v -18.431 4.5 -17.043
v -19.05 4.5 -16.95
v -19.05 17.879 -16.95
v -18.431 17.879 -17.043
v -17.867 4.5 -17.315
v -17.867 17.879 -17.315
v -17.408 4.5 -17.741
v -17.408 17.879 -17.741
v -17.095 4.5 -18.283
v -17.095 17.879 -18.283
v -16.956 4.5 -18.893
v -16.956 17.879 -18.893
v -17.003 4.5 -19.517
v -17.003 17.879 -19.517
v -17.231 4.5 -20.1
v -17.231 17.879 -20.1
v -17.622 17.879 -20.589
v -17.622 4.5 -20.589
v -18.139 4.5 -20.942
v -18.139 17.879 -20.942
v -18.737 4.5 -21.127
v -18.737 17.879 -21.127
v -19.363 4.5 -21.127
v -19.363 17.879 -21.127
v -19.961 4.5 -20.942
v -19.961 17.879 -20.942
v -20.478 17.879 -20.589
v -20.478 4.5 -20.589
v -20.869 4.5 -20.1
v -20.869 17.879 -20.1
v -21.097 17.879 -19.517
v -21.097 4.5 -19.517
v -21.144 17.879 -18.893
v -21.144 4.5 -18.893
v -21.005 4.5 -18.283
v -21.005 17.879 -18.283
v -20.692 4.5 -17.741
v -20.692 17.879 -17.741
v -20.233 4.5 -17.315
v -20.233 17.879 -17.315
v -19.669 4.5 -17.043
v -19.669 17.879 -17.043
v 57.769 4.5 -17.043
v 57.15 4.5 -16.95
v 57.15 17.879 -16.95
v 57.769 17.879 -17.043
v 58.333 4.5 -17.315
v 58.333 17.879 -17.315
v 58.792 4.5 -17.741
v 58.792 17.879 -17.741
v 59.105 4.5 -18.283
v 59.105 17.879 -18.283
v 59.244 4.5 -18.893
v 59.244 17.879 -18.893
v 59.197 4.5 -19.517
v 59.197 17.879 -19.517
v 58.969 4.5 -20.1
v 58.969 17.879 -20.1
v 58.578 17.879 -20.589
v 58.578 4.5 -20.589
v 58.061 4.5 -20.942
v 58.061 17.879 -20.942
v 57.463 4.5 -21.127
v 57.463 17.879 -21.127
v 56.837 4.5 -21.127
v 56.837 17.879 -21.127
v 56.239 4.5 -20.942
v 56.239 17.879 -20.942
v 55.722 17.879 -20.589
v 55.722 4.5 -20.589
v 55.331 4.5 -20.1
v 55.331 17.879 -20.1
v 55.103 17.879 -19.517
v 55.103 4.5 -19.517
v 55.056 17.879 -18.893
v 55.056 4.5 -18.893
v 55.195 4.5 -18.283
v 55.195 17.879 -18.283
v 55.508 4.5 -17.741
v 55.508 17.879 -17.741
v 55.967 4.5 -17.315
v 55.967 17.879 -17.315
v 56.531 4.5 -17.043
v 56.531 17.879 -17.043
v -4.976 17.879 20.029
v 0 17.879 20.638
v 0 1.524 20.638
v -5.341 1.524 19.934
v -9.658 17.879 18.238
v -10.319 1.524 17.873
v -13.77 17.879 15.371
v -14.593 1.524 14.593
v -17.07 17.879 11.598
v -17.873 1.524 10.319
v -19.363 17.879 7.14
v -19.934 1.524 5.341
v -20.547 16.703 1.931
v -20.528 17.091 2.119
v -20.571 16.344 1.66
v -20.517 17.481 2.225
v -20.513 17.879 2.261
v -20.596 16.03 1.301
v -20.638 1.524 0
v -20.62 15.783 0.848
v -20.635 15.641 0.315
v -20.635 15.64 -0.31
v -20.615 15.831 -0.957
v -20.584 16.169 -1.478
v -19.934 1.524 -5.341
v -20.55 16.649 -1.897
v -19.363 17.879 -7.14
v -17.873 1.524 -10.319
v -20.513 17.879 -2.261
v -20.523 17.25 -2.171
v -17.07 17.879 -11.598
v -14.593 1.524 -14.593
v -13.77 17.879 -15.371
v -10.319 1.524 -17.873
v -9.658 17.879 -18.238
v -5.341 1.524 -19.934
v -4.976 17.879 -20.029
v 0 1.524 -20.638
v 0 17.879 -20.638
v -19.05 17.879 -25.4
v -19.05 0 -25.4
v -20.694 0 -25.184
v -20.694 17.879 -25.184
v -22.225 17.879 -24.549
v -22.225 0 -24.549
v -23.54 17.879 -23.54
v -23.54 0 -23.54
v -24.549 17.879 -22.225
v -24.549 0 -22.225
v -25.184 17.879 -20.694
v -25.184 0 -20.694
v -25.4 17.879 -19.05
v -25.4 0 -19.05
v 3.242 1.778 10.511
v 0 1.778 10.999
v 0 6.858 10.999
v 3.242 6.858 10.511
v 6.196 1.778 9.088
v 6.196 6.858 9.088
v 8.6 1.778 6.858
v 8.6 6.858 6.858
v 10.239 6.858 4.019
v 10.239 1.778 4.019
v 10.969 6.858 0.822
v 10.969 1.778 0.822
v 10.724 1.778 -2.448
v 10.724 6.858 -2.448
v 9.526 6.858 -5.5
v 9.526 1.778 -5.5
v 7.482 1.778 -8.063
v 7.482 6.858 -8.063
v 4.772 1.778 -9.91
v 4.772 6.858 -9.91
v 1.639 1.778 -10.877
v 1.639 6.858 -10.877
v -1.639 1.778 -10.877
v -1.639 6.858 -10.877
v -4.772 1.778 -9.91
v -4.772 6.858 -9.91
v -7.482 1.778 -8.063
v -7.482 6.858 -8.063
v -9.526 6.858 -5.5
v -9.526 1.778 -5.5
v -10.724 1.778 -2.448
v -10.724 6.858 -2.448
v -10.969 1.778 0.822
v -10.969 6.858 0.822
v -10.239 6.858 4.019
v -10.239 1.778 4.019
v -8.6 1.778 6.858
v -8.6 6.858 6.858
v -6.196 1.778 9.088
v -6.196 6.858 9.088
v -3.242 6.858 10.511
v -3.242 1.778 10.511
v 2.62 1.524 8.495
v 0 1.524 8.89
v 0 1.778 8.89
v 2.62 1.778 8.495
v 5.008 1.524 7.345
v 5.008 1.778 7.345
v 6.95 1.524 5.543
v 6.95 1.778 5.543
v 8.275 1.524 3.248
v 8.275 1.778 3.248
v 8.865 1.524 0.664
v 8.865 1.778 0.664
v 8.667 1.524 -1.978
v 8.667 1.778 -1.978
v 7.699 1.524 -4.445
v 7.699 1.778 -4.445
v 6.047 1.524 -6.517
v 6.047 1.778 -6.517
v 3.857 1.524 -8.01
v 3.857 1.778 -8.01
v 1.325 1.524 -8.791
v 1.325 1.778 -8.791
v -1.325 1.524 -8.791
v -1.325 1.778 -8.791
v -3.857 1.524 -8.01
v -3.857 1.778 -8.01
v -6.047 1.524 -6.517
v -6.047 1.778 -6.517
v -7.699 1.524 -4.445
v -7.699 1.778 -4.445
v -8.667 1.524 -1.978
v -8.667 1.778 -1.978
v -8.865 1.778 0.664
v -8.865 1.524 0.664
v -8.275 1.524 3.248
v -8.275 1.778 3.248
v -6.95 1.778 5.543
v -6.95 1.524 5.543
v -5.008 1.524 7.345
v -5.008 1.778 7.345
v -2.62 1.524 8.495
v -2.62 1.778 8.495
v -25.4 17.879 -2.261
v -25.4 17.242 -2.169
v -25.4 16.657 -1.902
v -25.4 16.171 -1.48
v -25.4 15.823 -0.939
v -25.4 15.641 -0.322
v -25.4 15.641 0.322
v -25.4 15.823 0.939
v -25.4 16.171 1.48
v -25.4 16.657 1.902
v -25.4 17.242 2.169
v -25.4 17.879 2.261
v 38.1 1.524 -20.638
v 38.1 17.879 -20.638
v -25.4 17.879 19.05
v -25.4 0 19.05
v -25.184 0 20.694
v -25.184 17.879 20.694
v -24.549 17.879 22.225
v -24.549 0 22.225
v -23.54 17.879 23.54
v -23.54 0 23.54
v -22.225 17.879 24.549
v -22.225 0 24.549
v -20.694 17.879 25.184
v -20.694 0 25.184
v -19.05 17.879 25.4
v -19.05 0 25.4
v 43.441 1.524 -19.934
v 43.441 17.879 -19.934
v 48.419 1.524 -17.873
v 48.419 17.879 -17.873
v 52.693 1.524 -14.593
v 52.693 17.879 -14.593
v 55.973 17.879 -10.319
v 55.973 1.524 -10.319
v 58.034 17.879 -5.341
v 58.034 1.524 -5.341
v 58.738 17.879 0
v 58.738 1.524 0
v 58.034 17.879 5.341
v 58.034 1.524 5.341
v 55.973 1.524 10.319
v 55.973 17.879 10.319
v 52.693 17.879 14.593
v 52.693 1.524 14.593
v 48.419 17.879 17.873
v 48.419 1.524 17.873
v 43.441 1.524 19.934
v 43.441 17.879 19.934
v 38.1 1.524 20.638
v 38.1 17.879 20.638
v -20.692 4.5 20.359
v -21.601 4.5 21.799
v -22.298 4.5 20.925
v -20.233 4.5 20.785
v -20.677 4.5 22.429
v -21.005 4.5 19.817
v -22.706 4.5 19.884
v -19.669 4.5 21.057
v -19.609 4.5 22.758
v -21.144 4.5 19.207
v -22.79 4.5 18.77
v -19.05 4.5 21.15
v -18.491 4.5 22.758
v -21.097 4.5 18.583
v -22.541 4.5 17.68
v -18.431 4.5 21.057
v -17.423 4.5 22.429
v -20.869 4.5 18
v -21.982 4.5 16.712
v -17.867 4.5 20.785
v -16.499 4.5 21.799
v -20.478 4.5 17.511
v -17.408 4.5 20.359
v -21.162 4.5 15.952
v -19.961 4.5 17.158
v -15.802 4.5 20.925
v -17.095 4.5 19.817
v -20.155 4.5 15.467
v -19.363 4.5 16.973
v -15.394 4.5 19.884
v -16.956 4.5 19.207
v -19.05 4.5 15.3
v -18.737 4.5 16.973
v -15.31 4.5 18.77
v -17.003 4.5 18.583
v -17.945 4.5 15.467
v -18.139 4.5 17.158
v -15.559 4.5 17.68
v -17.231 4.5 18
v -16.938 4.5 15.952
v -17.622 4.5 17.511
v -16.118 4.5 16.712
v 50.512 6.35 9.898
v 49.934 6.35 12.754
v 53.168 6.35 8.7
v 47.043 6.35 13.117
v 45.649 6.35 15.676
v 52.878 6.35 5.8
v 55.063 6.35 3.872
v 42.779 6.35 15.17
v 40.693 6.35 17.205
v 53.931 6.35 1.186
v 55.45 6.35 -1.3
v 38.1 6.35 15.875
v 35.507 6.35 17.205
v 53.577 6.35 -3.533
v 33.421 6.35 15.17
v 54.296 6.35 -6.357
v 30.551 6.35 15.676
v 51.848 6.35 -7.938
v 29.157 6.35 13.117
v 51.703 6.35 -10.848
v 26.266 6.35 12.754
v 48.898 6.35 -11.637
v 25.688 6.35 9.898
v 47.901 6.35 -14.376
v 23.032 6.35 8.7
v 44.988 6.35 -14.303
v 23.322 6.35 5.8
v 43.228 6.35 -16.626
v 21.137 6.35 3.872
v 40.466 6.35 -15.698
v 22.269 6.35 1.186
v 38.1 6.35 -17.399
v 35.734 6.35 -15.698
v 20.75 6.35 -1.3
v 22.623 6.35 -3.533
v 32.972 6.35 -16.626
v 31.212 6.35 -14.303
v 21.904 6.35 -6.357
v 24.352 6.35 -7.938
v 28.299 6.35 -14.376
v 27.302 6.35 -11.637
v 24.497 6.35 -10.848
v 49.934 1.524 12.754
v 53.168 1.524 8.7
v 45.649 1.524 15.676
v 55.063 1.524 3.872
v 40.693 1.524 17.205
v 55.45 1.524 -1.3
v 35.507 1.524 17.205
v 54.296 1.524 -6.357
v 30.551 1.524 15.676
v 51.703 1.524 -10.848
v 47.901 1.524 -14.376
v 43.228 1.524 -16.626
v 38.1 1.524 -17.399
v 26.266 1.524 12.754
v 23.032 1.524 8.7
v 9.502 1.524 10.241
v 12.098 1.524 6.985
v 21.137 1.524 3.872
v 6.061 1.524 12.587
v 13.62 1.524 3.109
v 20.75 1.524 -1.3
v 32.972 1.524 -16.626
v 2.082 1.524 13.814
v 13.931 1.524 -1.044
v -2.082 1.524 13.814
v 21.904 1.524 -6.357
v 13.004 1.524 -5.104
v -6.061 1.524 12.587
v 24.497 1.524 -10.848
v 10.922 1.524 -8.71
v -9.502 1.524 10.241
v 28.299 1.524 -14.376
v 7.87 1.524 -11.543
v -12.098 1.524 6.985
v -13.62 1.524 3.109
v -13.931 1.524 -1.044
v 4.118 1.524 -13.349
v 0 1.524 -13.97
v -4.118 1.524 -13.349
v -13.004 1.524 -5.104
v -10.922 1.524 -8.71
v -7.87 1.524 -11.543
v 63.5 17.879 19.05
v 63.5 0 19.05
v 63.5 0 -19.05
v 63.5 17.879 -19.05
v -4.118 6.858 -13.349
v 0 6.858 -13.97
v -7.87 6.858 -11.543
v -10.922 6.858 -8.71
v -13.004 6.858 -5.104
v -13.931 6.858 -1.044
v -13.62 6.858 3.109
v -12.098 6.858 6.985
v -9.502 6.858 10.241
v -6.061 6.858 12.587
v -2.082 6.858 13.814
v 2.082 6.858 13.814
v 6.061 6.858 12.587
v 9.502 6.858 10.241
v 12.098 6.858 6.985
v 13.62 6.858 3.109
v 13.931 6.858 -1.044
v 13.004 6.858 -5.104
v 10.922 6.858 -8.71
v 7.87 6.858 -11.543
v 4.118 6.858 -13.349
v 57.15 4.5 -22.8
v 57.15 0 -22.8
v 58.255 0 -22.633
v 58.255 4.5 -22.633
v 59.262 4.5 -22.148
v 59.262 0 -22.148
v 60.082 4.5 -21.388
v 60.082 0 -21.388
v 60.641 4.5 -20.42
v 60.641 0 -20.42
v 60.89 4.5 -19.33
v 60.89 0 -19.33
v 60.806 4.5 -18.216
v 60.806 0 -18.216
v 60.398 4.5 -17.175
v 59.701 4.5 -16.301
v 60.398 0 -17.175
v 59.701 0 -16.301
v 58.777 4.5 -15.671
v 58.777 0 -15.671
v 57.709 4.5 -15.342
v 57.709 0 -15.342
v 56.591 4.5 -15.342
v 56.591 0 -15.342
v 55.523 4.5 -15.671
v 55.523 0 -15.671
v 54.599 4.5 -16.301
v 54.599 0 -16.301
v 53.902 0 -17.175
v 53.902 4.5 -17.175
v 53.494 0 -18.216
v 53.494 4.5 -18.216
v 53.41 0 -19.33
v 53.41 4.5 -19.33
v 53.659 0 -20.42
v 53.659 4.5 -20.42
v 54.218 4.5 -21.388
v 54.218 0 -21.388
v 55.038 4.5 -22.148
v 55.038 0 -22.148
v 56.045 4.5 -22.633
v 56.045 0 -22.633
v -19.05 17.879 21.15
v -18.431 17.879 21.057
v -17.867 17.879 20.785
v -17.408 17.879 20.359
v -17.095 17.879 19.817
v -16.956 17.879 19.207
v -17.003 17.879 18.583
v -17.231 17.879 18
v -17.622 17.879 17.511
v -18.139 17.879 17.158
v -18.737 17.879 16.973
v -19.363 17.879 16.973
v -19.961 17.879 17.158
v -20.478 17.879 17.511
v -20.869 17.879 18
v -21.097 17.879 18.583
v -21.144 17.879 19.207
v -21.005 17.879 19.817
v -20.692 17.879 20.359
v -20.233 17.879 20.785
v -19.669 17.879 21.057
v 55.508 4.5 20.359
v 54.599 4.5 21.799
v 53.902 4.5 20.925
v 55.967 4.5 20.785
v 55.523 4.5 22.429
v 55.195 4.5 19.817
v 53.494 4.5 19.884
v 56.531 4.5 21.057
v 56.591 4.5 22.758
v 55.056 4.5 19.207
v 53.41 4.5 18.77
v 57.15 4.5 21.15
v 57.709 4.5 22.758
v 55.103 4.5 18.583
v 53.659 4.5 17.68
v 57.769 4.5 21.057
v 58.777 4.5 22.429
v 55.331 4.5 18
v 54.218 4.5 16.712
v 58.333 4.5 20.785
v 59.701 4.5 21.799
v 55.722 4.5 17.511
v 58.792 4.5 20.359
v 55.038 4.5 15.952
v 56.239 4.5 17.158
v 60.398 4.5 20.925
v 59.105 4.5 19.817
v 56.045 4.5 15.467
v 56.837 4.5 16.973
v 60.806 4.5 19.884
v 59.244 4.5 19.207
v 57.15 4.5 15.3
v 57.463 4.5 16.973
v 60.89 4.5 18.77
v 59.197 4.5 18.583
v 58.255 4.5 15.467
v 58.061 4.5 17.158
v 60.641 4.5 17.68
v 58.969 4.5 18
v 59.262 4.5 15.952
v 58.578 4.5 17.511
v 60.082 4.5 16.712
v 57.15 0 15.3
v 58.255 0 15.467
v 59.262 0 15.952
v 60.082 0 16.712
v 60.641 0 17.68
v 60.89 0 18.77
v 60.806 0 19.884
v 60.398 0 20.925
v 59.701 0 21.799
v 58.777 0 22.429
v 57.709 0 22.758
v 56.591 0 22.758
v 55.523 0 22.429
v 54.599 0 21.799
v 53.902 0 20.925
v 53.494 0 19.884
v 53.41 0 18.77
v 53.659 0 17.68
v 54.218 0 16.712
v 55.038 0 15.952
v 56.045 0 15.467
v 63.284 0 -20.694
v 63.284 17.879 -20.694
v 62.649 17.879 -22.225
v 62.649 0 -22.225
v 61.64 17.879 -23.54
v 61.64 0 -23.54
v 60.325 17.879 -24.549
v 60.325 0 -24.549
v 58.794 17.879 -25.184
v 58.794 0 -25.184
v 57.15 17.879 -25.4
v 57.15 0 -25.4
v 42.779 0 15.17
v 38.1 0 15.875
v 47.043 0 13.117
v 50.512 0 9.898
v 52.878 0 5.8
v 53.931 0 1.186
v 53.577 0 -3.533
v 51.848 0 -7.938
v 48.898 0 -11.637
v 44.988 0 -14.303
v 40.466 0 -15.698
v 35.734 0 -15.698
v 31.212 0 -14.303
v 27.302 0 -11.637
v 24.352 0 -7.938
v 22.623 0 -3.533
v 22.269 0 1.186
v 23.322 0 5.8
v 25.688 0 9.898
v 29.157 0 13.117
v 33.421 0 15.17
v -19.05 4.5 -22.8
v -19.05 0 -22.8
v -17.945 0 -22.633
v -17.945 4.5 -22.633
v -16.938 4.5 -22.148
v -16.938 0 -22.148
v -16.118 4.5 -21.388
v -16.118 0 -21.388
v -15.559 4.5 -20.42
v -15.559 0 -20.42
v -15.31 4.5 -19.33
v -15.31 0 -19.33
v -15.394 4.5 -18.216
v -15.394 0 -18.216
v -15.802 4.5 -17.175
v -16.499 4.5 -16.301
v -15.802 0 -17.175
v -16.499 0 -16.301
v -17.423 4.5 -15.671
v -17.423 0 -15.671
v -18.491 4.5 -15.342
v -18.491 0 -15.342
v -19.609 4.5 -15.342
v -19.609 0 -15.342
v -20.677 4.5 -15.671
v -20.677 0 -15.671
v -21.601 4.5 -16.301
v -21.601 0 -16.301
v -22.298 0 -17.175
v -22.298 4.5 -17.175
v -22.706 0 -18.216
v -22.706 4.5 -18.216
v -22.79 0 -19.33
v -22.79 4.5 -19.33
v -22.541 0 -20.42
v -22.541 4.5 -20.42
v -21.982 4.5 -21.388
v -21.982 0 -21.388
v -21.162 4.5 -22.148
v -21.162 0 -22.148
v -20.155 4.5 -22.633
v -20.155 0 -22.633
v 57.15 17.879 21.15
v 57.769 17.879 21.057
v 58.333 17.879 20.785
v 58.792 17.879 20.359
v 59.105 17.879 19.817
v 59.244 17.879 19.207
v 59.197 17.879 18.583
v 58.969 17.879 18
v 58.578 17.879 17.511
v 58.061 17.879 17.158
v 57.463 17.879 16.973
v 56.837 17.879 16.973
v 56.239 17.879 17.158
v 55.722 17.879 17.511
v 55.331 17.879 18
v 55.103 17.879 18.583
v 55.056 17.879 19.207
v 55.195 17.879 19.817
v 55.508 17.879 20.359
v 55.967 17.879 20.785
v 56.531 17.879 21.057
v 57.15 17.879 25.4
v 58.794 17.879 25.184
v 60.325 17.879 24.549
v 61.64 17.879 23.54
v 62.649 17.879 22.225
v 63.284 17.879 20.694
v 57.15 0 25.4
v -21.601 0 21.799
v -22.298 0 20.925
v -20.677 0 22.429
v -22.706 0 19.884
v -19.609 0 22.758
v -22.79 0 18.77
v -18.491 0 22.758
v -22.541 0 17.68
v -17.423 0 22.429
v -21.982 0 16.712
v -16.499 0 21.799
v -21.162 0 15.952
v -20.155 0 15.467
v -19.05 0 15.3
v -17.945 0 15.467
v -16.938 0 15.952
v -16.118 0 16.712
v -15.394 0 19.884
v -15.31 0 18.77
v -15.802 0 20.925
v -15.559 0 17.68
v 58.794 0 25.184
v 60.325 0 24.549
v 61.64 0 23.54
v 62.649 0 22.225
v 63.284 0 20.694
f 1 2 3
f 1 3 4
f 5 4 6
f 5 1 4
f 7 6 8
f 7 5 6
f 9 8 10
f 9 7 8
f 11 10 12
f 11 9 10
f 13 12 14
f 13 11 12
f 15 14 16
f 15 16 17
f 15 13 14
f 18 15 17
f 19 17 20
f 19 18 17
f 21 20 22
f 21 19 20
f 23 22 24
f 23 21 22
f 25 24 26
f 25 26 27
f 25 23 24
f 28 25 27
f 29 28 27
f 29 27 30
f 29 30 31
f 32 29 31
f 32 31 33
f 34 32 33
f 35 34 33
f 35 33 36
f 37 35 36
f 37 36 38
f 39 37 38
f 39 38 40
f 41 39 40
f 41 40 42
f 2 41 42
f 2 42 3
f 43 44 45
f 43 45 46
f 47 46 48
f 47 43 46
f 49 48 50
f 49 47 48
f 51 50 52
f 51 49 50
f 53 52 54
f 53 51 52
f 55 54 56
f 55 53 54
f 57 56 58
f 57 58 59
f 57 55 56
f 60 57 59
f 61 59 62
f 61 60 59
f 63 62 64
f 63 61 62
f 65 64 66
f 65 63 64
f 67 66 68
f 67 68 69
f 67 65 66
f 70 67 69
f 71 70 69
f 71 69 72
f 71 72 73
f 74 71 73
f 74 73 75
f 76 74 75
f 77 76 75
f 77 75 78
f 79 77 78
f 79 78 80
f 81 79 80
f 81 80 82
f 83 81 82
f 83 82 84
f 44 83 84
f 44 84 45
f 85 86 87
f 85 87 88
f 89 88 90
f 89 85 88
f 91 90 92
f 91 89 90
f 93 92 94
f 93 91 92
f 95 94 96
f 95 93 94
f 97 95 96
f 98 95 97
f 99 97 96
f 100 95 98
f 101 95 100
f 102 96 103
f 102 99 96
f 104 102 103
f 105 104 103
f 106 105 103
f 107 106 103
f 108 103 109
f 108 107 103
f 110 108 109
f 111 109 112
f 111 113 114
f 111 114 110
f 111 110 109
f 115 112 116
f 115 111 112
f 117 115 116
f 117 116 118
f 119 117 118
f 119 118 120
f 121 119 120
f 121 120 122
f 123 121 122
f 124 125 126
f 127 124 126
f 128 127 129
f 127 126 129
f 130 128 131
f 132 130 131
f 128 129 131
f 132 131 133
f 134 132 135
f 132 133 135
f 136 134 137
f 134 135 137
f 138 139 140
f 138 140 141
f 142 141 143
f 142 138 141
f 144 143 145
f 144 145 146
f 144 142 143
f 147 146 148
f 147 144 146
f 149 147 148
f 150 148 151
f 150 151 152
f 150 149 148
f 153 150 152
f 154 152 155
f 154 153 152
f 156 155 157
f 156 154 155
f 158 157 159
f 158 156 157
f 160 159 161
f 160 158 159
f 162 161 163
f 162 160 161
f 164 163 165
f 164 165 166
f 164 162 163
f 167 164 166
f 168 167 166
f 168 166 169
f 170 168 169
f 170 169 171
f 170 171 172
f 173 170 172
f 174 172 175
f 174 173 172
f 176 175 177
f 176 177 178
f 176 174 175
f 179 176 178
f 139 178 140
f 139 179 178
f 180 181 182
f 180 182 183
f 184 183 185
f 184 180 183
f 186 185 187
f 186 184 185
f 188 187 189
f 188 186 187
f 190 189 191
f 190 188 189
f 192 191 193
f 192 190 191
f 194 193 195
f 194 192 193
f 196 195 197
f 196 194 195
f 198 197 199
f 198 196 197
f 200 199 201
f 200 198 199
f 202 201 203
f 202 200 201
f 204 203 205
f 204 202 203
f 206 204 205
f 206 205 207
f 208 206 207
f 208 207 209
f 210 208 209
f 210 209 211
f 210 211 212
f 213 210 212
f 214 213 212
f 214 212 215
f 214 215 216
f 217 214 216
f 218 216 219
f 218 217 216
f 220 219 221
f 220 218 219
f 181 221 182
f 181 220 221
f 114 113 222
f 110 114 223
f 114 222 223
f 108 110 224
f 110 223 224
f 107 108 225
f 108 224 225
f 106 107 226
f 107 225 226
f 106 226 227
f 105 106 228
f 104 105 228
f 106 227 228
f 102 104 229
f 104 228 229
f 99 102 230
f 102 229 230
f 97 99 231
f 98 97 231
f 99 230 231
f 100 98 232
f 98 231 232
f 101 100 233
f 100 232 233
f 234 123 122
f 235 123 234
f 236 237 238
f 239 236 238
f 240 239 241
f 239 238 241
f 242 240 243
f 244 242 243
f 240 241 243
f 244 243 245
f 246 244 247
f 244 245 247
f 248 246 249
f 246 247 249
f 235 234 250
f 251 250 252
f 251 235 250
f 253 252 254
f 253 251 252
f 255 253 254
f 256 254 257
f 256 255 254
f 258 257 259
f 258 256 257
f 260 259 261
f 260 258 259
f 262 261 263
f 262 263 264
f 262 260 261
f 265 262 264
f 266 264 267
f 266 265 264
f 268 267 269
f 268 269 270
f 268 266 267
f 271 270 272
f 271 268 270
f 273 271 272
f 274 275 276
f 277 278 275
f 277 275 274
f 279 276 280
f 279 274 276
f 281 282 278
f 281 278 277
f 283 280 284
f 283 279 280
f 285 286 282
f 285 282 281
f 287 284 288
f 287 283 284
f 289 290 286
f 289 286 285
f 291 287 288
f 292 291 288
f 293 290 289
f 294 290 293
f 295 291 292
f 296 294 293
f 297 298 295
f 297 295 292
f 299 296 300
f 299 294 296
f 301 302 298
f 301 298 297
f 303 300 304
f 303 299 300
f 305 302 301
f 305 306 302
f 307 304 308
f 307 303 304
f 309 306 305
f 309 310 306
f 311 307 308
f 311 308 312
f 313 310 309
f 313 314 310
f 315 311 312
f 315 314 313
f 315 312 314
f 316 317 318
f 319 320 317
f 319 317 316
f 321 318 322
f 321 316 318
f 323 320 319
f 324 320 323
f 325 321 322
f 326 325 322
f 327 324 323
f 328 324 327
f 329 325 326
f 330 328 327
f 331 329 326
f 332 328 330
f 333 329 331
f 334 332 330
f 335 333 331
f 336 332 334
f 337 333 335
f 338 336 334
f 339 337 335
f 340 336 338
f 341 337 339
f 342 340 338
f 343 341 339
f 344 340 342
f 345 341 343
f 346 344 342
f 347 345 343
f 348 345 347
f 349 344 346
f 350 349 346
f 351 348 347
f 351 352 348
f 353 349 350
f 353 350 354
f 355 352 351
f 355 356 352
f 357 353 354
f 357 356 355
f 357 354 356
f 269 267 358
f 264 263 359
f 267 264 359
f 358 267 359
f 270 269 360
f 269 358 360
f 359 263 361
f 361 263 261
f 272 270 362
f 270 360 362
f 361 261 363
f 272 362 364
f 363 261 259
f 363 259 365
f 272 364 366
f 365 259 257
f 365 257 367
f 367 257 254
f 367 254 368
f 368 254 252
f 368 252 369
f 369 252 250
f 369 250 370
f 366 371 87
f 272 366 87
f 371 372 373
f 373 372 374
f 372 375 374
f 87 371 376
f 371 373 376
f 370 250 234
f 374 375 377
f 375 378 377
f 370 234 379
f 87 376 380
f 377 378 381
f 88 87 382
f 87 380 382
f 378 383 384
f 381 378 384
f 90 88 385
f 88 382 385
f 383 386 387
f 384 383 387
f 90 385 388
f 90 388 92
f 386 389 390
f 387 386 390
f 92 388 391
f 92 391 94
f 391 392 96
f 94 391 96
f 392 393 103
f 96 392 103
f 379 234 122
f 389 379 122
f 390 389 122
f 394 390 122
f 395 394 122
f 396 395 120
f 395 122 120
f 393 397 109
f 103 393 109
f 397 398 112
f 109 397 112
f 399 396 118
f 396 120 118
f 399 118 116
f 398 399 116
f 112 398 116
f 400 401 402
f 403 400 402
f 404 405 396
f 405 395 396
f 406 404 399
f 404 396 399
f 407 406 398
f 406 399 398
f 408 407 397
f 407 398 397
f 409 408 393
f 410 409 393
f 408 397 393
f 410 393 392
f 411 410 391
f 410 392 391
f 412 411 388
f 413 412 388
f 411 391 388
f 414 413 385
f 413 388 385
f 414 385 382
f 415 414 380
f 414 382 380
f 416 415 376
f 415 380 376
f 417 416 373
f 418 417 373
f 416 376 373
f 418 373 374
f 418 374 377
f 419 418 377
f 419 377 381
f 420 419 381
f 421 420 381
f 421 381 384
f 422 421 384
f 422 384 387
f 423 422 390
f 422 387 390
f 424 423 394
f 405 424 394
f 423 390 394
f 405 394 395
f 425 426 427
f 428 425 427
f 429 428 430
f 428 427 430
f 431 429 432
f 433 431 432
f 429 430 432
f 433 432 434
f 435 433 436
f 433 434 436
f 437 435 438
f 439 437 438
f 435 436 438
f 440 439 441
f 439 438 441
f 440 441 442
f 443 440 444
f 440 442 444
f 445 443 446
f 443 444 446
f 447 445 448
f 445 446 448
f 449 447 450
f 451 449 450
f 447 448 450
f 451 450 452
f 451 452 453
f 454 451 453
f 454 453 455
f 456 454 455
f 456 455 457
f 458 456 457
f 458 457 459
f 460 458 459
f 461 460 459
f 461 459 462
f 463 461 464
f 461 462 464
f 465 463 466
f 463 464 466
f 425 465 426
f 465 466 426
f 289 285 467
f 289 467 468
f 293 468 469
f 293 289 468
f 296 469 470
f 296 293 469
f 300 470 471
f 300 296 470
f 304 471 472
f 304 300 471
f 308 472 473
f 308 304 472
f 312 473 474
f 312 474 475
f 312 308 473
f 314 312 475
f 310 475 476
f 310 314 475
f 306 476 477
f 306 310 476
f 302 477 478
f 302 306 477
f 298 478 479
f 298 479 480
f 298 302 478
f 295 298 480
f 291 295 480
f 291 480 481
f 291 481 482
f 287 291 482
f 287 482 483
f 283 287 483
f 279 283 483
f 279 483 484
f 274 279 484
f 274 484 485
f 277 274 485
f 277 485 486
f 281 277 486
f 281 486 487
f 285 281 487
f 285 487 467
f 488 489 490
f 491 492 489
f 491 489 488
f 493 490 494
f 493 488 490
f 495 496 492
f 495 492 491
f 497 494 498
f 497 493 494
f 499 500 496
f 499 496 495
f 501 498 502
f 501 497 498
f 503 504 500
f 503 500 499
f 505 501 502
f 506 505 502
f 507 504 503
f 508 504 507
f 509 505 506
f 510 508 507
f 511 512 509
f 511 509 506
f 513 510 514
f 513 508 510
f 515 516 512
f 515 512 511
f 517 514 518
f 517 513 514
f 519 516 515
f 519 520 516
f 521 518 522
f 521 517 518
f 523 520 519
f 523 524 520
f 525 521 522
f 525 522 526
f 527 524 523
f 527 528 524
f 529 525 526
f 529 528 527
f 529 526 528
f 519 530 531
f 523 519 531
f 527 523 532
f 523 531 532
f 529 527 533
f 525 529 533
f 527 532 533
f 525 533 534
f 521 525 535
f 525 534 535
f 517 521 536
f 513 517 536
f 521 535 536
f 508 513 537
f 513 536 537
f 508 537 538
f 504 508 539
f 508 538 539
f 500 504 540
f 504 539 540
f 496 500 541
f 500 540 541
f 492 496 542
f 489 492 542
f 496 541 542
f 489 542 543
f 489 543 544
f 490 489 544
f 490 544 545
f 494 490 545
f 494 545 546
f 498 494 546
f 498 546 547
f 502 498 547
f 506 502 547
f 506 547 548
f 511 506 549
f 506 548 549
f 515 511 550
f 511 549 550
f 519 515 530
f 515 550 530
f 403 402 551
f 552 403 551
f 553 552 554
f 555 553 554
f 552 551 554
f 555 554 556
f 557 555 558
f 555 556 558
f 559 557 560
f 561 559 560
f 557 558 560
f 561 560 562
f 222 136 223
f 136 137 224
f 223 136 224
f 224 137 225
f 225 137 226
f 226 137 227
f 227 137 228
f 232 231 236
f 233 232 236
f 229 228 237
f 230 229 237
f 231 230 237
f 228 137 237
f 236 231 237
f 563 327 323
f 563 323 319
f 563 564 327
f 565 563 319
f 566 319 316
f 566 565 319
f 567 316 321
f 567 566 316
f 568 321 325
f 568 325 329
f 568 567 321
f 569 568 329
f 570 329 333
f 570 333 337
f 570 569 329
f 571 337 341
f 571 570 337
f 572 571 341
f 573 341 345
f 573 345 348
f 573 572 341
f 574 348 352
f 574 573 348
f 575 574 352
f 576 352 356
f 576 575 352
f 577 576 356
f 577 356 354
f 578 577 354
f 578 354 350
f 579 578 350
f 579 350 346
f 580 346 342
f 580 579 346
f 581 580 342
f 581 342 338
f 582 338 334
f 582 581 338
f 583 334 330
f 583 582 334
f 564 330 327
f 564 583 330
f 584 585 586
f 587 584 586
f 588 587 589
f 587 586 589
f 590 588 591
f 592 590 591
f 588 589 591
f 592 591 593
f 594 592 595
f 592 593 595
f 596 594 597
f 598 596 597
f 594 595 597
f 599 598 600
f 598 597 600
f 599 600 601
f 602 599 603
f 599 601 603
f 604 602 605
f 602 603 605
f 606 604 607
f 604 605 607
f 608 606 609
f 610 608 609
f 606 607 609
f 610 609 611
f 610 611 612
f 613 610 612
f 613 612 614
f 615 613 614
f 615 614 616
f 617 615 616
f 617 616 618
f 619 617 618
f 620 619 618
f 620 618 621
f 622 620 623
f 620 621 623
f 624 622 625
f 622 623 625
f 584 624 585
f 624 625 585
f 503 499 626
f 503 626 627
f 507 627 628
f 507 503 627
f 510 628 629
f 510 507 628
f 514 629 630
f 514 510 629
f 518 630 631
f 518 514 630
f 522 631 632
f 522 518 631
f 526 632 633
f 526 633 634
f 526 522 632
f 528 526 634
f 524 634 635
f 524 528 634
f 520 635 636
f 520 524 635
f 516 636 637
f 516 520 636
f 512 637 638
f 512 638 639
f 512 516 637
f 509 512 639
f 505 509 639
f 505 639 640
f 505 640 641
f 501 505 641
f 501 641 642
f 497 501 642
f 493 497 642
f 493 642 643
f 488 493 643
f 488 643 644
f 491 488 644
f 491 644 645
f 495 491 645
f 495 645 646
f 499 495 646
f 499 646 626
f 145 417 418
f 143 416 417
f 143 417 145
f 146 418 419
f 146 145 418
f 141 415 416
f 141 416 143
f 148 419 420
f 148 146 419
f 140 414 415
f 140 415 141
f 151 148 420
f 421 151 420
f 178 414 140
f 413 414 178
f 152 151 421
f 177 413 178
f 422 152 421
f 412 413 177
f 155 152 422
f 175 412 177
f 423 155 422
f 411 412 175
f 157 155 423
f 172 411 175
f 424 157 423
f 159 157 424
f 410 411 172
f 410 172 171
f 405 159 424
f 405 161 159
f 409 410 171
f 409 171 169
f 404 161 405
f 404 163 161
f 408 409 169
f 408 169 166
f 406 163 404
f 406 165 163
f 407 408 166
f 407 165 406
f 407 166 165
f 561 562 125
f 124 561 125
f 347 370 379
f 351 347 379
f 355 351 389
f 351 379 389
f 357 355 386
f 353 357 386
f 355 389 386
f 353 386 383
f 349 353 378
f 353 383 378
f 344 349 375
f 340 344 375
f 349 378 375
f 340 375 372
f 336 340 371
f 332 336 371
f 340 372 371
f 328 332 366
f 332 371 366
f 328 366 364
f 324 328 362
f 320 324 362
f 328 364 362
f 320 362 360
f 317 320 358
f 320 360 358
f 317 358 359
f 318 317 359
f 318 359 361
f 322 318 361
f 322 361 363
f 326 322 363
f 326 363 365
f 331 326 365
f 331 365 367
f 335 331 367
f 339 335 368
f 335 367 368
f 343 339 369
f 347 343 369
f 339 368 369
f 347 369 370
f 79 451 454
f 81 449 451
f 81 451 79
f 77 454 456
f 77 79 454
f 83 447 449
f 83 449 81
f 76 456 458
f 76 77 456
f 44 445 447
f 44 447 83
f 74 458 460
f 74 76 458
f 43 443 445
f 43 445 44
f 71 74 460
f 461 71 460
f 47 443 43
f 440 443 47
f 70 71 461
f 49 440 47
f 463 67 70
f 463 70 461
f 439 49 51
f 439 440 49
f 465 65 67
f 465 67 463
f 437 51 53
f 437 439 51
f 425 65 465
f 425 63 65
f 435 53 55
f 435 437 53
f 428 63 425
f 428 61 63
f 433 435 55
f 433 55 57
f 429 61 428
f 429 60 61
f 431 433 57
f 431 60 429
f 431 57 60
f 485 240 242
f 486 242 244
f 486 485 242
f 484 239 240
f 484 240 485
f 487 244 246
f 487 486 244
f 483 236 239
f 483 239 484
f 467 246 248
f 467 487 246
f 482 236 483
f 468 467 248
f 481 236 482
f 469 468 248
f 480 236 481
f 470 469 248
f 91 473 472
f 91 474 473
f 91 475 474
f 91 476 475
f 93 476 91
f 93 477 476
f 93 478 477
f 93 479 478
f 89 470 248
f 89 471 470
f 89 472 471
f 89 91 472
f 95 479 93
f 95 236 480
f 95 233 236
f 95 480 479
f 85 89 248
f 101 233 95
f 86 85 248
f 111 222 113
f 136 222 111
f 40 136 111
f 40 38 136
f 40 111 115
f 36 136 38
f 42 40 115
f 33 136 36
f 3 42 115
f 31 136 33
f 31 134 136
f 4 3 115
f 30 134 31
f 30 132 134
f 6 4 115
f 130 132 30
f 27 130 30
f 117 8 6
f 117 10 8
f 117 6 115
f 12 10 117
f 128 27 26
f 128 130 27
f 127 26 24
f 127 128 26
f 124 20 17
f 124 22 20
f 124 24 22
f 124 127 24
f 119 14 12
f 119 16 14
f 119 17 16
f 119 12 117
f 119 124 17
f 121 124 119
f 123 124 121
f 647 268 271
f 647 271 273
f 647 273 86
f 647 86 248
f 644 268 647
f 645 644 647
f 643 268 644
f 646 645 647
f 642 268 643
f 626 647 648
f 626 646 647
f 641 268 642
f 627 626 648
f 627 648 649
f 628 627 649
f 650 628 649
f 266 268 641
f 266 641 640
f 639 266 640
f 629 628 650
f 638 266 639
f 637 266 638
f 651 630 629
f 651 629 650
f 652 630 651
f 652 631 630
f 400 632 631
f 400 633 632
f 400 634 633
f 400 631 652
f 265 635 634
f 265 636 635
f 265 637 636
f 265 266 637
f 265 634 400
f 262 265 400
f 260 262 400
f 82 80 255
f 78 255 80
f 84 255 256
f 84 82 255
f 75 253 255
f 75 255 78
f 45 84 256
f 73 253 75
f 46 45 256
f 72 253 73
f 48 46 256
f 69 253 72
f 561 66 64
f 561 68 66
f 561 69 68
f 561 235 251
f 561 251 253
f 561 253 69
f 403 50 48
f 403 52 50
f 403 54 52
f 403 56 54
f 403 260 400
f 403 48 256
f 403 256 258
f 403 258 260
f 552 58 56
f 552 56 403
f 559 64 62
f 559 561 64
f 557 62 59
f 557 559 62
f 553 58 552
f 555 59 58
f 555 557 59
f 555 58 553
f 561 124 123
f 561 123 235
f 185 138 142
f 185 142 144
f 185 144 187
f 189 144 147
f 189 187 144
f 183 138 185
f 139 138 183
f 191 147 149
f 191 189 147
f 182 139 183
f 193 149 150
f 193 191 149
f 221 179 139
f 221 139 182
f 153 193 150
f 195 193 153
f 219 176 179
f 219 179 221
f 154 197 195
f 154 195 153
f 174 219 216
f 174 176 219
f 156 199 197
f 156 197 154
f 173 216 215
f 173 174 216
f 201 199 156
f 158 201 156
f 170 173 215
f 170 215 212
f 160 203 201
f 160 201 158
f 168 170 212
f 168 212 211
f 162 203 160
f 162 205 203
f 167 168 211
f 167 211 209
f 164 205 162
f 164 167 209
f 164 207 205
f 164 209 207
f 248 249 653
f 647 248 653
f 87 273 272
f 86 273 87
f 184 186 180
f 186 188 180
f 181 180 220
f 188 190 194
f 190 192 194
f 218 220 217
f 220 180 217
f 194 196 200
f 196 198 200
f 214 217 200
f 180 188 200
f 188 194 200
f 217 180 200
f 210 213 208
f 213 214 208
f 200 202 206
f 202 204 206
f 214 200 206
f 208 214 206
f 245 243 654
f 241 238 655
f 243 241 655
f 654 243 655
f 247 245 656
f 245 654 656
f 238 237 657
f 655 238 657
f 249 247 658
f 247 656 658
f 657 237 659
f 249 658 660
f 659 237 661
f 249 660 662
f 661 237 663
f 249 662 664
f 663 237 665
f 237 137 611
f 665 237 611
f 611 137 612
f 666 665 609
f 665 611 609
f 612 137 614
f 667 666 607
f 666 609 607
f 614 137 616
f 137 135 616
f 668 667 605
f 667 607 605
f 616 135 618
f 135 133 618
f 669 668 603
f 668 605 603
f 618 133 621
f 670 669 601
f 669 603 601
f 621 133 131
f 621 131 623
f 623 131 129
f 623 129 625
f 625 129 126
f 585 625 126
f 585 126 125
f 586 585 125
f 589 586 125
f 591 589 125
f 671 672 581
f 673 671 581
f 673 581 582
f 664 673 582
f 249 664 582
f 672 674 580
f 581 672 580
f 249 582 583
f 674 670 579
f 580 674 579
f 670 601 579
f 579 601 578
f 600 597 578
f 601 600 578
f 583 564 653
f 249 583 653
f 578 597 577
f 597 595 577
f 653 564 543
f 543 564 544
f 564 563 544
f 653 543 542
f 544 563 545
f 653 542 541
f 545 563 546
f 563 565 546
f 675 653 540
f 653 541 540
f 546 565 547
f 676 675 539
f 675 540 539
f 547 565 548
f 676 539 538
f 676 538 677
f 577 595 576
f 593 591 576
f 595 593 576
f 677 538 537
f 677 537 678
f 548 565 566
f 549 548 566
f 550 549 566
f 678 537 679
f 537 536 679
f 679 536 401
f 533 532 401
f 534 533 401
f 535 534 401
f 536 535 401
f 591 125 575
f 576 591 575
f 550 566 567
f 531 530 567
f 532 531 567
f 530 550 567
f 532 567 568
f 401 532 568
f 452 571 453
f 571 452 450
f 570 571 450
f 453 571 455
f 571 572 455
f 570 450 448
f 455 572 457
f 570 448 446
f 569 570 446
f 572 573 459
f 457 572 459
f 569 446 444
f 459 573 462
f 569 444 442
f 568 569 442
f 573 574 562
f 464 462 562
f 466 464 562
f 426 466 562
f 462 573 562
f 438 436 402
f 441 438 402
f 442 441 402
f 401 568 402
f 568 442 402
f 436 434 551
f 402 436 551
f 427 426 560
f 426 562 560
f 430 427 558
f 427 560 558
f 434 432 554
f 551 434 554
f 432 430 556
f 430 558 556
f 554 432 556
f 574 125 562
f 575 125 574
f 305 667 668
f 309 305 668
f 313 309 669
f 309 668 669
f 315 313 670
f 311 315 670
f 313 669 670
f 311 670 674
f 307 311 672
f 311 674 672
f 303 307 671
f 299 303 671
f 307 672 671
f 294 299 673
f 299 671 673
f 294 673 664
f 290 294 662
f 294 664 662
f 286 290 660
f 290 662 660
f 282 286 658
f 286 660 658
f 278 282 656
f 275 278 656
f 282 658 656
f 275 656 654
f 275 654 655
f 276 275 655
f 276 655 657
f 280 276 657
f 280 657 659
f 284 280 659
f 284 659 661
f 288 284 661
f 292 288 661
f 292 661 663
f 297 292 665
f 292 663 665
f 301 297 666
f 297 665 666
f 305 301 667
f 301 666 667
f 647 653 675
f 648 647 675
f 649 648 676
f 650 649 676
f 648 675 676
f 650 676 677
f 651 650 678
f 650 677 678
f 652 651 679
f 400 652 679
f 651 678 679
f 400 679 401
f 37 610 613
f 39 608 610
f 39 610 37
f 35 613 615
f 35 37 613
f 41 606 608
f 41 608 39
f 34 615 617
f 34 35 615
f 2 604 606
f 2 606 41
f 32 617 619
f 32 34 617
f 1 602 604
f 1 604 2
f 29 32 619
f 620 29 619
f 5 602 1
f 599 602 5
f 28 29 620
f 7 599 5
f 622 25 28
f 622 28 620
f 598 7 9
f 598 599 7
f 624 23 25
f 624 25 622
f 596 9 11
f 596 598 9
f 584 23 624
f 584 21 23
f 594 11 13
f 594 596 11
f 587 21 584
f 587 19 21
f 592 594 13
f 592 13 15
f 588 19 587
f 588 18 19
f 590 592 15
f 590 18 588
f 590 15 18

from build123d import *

# Parameters (mm, degrees)
SKETCH1_R               = 15.875
SKETCH1_R_2             = 2.1
BOSS_EXTRUDE1_DEPTH     = 17.87906
CUT_EXTRUDE1_DEPTH      = 16.35506
SKETCH3_R               = 13.97
SKETCH3_R_2             = 8.89
BOSS_EXTRUDE2_DEPTH     = 0.254
SKETCH4_R               = 13.97
SKETCH4_R_2             = 10.99947
BOSS_EXTRUDE3_DEPTH     = 5.08
SKETCH5_R               = 17.399
SKETCH5_R_2             = 15.875
BOSS_EXTRUDE4_DEPTH     = 4.826
CUT_EXTRUDE2_REACH      = 96.17
CUT_EXTRUDE2_END_RADIUS = 20.6375
SKETCH6_R               = 2.2606
SKETCH7_R               = 3.75
CUT_EXTRUDE3_DEPTH      = 4.5


with BuildPart() as part:
    # Sketch1 → Boss-Extrude1 (new body)
    with BuildSketch(Plane(origin=(0, 0, 0), x_dir=(1, 0, 0), z_dir=(0, 1, 0))):
        with BuildLine():
            Line((-19.05, -25.4), (57.15, -25.4))
            ThreePointArc((57.15, -25.4), (61.640128061, -23.540128061), (63.5, -19.05))
            Line((63.5, -19.05), (63.5, 19.05))
            ThreePointArc((63.5, 19.05), (61.640128061, 23.540128061), (57.15, 25.4))
            Line((57.15, 25.4), (-19.05, 25.4))
            ThreePointArc((-19.05, 25.4), (-23.540128061, 23.540128061), (-25.4, 19.05))
            Line((-25.4, 19.05), (-25.4, -19.05))
            ThreePointArc((-25.4, -19.05), (-23.540128061, -23.540128061), (-19.05, -25.4))
        make_face()
        with Locations(Location((38.1, 0, 0), (0, 0, 270))):
            Circle(SKETCH1_R, mode=Mode.SUBTRACT)
        with Locations(Location((-19.05, 19.05, 0), (0, 0, 270))):
            Circle(SKETCH1_R_2, mode=Mode.SUBTRACT)
        with Locations(Location((-19.05, -19.05, 0), (0, 0, 270))):
            Circle(SKETCH1_R_2, mode=Mode.SUBTRACT)
        with Locations(Location((57.15, -19.05, 0), (0, 0, 270))):
            Circle(SKETCH1_R_2, mode=Mode.SUBTRACT)
        with Locations(Location((57.15, 19.05, 0), (0, 0, 270))):
            Circle(SKETCH1_R_2, mode=Mode.SUBTRACT)
    extrude(amount=BOSS_EXTRUDE1_DEPTH)

    # Sketch2 → Cut-Extrude1 (cut)
    with BuildSketch(Plane(origin=(0, 17.87906, 0), x_dir=(1, 0, 0), z_dir=(0, 1, 0))):
        with BuildLine():
            Line((0, 20.6375), (38.1, 20.6375))
            ThreePointArc((38.1, 20.6375), (58.7375, 0), (38.1, -20.6375))
            Line((38.1, -20.6375), (0, -20.6375))
            ThreePointArc((0, -20.6375), (-20.6375, 0), (0, 20.6375))
        make_face()
    extrude(amount=-CUT_EXTRUDE1_DEPTH, mode=Mode.SUBTRACT)

    # Sketch3 → Boss-Extrude2 (add)
    with BuildSketch(Plane(origin=(0, 1.524, 0), x_dir=(1, 0, 0), z_dir=(0, 1, 0))):
        with Locations(Location((0, 0, 0), (0, 0, 90))):
            Circle(SKETCH3_R)
        with Locations(Location((0, 0, 0), (0, 0, 270))):
            Circle(SKETCH3_R_2, mode=Mode.SUBTRACT)
    extrude(amount=BOSS_EXTRUDE2_DEPTH)

    # Sketch4 → Boss-Extrude3 (add)
    with BuildSketch(Plane(origin=(0, 1.778, 0), x_dir=(1, 0, 0), z_dir=(0, 1, 0))):
        with Locations(Location((0, 0, 0), (0, 0, 90))):
            Circle(SKETCH4_R)
        with Locations(Location((0, 0, 0), (0, 0, 270))):
            Circle(SKETCH4_R_2, mode=Mode.SUBTRACT)
    extrude(amount=BOSS_EXTRUDE3_DEPTH)

    # Sketch5 → Boss-Extrude4 (add)
    with BuildSketch(Plane(origin=(0, 1.524, 0), x_dir=(1, 0, 0), z_dir=(0, 1, 0))):
        with Locations(Location((38.1, 0, 0), (0, 0, 90))):
            Circle(SKETCH5_R)
        with Locations(Location((38.1, 0, 0), (0, 0, 270))):
            Circle(SKETCH5_R_2, mode=Mode.SUBTRACT)
    extrude(amount=BOSS_EXTRUDE4_DEPTH)

    # Cut-Extrude2: up to this cylinder (the profile starts outside it)
    cut_extrude2_end = Plane(origin=(0, 17.87906, 0), z_dir=(0, 1, 0)) * Cylinder(CUT_EXTRUDE2_END_RADIUS, 234.615, mode=Mode.PRIVATE)
    # Sketch6 → Cut-Extrude2 (cut, up to the surface)
    with BuildSketch(Plane.ZY.offset(25.4), mode=Mode.PRIVATE) as cut_extrude2_sk1:
        with Locations((0, 17.87906)):
            Circle(SKETCH6_R)
    cut_extrude2_tool1 = extrude(cut_extrude2_sk1.sketch, amount=-CUT_EXTRUDE2_REACH, mode=Mode.PRIVATE) - cut_extrude2_end
    add(cut_extrude2_tool1.solids().sort_by_distance((-25.4, 17.87906, 0))[0], mode=Mode.SUBTRACT)

    # Sketch7 → Cut-Extrude3 (cut)
    with BuildSketch(Plane.XZ):
        with Locations(Location((-19.05, 19.05, 0), (0, 0, 270))):
            Circle(SKETCH7_R)
        with Locations(Location((-19.05, -19.05, 0), (0, 0, 270))):
            Circle(SKETCH7_R)
        with Locations(Location((57.15, -19.05, 0), (0, 0, 270))):
            Circle(SKETCH7_R)
        with Locations(Location((57.15, 19.05, 0), (0, 0, 270))):
            Circle(SKETCH7_R)
    extrude(amount=-CUT_EXTRUDE3_DEPTH, mode=Mode.SUBTRACT)


solid = part.part
